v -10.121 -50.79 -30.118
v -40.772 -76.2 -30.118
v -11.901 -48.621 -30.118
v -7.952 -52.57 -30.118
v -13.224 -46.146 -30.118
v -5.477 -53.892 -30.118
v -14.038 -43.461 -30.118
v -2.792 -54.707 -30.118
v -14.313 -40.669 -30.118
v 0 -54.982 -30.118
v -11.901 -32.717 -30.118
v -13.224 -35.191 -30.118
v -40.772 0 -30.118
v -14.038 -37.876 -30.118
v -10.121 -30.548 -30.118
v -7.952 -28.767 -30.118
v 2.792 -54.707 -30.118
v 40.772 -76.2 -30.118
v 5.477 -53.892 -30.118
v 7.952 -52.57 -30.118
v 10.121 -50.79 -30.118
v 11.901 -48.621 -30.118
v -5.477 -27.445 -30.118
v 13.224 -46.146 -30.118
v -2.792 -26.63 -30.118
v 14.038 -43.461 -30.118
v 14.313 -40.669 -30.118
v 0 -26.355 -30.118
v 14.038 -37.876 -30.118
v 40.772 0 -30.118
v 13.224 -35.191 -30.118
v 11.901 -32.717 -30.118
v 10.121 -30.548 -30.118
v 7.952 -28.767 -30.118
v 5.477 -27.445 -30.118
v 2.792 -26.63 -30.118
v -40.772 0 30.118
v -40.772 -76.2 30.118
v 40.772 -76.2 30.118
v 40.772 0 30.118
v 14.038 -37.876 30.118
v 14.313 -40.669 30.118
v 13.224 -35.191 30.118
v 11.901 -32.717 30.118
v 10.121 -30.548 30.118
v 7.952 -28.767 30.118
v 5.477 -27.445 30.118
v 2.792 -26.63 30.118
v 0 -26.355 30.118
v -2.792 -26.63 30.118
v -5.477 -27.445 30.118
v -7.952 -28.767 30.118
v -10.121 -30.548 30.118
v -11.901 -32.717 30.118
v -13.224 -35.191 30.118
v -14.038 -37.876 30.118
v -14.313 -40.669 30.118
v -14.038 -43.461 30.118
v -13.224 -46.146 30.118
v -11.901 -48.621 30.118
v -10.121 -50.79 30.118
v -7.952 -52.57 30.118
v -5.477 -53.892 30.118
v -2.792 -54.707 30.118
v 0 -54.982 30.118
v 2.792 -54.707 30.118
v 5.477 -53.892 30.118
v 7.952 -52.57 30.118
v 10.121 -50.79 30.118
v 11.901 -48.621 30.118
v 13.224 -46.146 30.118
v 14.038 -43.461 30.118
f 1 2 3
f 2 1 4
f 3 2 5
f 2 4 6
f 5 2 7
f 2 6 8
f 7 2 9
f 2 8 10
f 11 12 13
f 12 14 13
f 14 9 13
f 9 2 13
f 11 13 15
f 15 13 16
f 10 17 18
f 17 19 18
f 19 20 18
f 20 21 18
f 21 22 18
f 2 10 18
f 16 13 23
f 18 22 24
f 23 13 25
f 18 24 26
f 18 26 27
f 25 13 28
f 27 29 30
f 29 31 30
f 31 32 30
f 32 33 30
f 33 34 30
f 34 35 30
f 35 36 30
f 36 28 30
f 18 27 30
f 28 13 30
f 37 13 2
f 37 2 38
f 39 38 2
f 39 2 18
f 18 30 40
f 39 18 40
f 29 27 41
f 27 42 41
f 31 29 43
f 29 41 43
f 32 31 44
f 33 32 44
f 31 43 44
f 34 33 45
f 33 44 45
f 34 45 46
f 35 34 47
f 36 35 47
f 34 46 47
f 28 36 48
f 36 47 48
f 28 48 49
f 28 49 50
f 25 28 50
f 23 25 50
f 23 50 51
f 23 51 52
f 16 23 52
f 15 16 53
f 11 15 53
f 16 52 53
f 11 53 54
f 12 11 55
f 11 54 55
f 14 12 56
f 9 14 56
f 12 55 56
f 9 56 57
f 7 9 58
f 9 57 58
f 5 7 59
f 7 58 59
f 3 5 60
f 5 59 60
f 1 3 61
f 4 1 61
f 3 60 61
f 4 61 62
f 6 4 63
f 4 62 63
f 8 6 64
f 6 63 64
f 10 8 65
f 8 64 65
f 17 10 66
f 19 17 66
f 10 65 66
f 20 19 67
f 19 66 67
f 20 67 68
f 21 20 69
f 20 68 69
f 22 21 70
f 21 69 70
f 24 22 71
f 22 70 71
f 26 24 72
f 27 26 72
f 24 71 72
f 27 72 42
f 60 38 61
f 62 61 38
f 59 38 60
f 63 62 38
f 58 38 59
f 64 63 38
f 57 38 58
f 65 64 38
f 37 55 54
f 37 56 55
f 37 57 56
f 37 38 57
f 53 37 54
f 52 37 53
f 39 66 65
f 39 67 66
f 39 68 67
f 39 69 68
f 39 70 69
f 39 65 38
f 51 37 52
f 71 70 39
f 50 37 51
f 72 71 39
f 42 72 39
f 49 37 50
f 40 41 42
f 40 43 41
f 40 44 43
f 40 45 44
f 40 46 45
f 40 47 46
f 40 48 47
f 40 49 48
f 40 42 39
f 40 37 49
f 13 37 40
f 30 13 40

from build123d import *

# Parameters (mm, degrees)
F0_W     = 81.543564
F0_H     = 60.235682
F1_DEPTH = 76.2
F2_R     = 14.31333
F3_DEPTH = 63.5


with BuildPart() as f1:
    # F0 (on Front) → F1 (new body)
    with BuildSketch(Plane.XZ):
        Rectangle(F0_W, F0_H)
    extrude(amount=F1_DEPTH)

    # F2 (on face) → F3 (cut, symmetric)
    with BuildSketch(Plane.XY.offset(30.117841)):
        with Locations((0, -40.668592)):
            Circle(F2_R)
    extrude(amount=F3_DEPTH, both=True, mode=Mode.SUBTRACT)


solid = f1.part
